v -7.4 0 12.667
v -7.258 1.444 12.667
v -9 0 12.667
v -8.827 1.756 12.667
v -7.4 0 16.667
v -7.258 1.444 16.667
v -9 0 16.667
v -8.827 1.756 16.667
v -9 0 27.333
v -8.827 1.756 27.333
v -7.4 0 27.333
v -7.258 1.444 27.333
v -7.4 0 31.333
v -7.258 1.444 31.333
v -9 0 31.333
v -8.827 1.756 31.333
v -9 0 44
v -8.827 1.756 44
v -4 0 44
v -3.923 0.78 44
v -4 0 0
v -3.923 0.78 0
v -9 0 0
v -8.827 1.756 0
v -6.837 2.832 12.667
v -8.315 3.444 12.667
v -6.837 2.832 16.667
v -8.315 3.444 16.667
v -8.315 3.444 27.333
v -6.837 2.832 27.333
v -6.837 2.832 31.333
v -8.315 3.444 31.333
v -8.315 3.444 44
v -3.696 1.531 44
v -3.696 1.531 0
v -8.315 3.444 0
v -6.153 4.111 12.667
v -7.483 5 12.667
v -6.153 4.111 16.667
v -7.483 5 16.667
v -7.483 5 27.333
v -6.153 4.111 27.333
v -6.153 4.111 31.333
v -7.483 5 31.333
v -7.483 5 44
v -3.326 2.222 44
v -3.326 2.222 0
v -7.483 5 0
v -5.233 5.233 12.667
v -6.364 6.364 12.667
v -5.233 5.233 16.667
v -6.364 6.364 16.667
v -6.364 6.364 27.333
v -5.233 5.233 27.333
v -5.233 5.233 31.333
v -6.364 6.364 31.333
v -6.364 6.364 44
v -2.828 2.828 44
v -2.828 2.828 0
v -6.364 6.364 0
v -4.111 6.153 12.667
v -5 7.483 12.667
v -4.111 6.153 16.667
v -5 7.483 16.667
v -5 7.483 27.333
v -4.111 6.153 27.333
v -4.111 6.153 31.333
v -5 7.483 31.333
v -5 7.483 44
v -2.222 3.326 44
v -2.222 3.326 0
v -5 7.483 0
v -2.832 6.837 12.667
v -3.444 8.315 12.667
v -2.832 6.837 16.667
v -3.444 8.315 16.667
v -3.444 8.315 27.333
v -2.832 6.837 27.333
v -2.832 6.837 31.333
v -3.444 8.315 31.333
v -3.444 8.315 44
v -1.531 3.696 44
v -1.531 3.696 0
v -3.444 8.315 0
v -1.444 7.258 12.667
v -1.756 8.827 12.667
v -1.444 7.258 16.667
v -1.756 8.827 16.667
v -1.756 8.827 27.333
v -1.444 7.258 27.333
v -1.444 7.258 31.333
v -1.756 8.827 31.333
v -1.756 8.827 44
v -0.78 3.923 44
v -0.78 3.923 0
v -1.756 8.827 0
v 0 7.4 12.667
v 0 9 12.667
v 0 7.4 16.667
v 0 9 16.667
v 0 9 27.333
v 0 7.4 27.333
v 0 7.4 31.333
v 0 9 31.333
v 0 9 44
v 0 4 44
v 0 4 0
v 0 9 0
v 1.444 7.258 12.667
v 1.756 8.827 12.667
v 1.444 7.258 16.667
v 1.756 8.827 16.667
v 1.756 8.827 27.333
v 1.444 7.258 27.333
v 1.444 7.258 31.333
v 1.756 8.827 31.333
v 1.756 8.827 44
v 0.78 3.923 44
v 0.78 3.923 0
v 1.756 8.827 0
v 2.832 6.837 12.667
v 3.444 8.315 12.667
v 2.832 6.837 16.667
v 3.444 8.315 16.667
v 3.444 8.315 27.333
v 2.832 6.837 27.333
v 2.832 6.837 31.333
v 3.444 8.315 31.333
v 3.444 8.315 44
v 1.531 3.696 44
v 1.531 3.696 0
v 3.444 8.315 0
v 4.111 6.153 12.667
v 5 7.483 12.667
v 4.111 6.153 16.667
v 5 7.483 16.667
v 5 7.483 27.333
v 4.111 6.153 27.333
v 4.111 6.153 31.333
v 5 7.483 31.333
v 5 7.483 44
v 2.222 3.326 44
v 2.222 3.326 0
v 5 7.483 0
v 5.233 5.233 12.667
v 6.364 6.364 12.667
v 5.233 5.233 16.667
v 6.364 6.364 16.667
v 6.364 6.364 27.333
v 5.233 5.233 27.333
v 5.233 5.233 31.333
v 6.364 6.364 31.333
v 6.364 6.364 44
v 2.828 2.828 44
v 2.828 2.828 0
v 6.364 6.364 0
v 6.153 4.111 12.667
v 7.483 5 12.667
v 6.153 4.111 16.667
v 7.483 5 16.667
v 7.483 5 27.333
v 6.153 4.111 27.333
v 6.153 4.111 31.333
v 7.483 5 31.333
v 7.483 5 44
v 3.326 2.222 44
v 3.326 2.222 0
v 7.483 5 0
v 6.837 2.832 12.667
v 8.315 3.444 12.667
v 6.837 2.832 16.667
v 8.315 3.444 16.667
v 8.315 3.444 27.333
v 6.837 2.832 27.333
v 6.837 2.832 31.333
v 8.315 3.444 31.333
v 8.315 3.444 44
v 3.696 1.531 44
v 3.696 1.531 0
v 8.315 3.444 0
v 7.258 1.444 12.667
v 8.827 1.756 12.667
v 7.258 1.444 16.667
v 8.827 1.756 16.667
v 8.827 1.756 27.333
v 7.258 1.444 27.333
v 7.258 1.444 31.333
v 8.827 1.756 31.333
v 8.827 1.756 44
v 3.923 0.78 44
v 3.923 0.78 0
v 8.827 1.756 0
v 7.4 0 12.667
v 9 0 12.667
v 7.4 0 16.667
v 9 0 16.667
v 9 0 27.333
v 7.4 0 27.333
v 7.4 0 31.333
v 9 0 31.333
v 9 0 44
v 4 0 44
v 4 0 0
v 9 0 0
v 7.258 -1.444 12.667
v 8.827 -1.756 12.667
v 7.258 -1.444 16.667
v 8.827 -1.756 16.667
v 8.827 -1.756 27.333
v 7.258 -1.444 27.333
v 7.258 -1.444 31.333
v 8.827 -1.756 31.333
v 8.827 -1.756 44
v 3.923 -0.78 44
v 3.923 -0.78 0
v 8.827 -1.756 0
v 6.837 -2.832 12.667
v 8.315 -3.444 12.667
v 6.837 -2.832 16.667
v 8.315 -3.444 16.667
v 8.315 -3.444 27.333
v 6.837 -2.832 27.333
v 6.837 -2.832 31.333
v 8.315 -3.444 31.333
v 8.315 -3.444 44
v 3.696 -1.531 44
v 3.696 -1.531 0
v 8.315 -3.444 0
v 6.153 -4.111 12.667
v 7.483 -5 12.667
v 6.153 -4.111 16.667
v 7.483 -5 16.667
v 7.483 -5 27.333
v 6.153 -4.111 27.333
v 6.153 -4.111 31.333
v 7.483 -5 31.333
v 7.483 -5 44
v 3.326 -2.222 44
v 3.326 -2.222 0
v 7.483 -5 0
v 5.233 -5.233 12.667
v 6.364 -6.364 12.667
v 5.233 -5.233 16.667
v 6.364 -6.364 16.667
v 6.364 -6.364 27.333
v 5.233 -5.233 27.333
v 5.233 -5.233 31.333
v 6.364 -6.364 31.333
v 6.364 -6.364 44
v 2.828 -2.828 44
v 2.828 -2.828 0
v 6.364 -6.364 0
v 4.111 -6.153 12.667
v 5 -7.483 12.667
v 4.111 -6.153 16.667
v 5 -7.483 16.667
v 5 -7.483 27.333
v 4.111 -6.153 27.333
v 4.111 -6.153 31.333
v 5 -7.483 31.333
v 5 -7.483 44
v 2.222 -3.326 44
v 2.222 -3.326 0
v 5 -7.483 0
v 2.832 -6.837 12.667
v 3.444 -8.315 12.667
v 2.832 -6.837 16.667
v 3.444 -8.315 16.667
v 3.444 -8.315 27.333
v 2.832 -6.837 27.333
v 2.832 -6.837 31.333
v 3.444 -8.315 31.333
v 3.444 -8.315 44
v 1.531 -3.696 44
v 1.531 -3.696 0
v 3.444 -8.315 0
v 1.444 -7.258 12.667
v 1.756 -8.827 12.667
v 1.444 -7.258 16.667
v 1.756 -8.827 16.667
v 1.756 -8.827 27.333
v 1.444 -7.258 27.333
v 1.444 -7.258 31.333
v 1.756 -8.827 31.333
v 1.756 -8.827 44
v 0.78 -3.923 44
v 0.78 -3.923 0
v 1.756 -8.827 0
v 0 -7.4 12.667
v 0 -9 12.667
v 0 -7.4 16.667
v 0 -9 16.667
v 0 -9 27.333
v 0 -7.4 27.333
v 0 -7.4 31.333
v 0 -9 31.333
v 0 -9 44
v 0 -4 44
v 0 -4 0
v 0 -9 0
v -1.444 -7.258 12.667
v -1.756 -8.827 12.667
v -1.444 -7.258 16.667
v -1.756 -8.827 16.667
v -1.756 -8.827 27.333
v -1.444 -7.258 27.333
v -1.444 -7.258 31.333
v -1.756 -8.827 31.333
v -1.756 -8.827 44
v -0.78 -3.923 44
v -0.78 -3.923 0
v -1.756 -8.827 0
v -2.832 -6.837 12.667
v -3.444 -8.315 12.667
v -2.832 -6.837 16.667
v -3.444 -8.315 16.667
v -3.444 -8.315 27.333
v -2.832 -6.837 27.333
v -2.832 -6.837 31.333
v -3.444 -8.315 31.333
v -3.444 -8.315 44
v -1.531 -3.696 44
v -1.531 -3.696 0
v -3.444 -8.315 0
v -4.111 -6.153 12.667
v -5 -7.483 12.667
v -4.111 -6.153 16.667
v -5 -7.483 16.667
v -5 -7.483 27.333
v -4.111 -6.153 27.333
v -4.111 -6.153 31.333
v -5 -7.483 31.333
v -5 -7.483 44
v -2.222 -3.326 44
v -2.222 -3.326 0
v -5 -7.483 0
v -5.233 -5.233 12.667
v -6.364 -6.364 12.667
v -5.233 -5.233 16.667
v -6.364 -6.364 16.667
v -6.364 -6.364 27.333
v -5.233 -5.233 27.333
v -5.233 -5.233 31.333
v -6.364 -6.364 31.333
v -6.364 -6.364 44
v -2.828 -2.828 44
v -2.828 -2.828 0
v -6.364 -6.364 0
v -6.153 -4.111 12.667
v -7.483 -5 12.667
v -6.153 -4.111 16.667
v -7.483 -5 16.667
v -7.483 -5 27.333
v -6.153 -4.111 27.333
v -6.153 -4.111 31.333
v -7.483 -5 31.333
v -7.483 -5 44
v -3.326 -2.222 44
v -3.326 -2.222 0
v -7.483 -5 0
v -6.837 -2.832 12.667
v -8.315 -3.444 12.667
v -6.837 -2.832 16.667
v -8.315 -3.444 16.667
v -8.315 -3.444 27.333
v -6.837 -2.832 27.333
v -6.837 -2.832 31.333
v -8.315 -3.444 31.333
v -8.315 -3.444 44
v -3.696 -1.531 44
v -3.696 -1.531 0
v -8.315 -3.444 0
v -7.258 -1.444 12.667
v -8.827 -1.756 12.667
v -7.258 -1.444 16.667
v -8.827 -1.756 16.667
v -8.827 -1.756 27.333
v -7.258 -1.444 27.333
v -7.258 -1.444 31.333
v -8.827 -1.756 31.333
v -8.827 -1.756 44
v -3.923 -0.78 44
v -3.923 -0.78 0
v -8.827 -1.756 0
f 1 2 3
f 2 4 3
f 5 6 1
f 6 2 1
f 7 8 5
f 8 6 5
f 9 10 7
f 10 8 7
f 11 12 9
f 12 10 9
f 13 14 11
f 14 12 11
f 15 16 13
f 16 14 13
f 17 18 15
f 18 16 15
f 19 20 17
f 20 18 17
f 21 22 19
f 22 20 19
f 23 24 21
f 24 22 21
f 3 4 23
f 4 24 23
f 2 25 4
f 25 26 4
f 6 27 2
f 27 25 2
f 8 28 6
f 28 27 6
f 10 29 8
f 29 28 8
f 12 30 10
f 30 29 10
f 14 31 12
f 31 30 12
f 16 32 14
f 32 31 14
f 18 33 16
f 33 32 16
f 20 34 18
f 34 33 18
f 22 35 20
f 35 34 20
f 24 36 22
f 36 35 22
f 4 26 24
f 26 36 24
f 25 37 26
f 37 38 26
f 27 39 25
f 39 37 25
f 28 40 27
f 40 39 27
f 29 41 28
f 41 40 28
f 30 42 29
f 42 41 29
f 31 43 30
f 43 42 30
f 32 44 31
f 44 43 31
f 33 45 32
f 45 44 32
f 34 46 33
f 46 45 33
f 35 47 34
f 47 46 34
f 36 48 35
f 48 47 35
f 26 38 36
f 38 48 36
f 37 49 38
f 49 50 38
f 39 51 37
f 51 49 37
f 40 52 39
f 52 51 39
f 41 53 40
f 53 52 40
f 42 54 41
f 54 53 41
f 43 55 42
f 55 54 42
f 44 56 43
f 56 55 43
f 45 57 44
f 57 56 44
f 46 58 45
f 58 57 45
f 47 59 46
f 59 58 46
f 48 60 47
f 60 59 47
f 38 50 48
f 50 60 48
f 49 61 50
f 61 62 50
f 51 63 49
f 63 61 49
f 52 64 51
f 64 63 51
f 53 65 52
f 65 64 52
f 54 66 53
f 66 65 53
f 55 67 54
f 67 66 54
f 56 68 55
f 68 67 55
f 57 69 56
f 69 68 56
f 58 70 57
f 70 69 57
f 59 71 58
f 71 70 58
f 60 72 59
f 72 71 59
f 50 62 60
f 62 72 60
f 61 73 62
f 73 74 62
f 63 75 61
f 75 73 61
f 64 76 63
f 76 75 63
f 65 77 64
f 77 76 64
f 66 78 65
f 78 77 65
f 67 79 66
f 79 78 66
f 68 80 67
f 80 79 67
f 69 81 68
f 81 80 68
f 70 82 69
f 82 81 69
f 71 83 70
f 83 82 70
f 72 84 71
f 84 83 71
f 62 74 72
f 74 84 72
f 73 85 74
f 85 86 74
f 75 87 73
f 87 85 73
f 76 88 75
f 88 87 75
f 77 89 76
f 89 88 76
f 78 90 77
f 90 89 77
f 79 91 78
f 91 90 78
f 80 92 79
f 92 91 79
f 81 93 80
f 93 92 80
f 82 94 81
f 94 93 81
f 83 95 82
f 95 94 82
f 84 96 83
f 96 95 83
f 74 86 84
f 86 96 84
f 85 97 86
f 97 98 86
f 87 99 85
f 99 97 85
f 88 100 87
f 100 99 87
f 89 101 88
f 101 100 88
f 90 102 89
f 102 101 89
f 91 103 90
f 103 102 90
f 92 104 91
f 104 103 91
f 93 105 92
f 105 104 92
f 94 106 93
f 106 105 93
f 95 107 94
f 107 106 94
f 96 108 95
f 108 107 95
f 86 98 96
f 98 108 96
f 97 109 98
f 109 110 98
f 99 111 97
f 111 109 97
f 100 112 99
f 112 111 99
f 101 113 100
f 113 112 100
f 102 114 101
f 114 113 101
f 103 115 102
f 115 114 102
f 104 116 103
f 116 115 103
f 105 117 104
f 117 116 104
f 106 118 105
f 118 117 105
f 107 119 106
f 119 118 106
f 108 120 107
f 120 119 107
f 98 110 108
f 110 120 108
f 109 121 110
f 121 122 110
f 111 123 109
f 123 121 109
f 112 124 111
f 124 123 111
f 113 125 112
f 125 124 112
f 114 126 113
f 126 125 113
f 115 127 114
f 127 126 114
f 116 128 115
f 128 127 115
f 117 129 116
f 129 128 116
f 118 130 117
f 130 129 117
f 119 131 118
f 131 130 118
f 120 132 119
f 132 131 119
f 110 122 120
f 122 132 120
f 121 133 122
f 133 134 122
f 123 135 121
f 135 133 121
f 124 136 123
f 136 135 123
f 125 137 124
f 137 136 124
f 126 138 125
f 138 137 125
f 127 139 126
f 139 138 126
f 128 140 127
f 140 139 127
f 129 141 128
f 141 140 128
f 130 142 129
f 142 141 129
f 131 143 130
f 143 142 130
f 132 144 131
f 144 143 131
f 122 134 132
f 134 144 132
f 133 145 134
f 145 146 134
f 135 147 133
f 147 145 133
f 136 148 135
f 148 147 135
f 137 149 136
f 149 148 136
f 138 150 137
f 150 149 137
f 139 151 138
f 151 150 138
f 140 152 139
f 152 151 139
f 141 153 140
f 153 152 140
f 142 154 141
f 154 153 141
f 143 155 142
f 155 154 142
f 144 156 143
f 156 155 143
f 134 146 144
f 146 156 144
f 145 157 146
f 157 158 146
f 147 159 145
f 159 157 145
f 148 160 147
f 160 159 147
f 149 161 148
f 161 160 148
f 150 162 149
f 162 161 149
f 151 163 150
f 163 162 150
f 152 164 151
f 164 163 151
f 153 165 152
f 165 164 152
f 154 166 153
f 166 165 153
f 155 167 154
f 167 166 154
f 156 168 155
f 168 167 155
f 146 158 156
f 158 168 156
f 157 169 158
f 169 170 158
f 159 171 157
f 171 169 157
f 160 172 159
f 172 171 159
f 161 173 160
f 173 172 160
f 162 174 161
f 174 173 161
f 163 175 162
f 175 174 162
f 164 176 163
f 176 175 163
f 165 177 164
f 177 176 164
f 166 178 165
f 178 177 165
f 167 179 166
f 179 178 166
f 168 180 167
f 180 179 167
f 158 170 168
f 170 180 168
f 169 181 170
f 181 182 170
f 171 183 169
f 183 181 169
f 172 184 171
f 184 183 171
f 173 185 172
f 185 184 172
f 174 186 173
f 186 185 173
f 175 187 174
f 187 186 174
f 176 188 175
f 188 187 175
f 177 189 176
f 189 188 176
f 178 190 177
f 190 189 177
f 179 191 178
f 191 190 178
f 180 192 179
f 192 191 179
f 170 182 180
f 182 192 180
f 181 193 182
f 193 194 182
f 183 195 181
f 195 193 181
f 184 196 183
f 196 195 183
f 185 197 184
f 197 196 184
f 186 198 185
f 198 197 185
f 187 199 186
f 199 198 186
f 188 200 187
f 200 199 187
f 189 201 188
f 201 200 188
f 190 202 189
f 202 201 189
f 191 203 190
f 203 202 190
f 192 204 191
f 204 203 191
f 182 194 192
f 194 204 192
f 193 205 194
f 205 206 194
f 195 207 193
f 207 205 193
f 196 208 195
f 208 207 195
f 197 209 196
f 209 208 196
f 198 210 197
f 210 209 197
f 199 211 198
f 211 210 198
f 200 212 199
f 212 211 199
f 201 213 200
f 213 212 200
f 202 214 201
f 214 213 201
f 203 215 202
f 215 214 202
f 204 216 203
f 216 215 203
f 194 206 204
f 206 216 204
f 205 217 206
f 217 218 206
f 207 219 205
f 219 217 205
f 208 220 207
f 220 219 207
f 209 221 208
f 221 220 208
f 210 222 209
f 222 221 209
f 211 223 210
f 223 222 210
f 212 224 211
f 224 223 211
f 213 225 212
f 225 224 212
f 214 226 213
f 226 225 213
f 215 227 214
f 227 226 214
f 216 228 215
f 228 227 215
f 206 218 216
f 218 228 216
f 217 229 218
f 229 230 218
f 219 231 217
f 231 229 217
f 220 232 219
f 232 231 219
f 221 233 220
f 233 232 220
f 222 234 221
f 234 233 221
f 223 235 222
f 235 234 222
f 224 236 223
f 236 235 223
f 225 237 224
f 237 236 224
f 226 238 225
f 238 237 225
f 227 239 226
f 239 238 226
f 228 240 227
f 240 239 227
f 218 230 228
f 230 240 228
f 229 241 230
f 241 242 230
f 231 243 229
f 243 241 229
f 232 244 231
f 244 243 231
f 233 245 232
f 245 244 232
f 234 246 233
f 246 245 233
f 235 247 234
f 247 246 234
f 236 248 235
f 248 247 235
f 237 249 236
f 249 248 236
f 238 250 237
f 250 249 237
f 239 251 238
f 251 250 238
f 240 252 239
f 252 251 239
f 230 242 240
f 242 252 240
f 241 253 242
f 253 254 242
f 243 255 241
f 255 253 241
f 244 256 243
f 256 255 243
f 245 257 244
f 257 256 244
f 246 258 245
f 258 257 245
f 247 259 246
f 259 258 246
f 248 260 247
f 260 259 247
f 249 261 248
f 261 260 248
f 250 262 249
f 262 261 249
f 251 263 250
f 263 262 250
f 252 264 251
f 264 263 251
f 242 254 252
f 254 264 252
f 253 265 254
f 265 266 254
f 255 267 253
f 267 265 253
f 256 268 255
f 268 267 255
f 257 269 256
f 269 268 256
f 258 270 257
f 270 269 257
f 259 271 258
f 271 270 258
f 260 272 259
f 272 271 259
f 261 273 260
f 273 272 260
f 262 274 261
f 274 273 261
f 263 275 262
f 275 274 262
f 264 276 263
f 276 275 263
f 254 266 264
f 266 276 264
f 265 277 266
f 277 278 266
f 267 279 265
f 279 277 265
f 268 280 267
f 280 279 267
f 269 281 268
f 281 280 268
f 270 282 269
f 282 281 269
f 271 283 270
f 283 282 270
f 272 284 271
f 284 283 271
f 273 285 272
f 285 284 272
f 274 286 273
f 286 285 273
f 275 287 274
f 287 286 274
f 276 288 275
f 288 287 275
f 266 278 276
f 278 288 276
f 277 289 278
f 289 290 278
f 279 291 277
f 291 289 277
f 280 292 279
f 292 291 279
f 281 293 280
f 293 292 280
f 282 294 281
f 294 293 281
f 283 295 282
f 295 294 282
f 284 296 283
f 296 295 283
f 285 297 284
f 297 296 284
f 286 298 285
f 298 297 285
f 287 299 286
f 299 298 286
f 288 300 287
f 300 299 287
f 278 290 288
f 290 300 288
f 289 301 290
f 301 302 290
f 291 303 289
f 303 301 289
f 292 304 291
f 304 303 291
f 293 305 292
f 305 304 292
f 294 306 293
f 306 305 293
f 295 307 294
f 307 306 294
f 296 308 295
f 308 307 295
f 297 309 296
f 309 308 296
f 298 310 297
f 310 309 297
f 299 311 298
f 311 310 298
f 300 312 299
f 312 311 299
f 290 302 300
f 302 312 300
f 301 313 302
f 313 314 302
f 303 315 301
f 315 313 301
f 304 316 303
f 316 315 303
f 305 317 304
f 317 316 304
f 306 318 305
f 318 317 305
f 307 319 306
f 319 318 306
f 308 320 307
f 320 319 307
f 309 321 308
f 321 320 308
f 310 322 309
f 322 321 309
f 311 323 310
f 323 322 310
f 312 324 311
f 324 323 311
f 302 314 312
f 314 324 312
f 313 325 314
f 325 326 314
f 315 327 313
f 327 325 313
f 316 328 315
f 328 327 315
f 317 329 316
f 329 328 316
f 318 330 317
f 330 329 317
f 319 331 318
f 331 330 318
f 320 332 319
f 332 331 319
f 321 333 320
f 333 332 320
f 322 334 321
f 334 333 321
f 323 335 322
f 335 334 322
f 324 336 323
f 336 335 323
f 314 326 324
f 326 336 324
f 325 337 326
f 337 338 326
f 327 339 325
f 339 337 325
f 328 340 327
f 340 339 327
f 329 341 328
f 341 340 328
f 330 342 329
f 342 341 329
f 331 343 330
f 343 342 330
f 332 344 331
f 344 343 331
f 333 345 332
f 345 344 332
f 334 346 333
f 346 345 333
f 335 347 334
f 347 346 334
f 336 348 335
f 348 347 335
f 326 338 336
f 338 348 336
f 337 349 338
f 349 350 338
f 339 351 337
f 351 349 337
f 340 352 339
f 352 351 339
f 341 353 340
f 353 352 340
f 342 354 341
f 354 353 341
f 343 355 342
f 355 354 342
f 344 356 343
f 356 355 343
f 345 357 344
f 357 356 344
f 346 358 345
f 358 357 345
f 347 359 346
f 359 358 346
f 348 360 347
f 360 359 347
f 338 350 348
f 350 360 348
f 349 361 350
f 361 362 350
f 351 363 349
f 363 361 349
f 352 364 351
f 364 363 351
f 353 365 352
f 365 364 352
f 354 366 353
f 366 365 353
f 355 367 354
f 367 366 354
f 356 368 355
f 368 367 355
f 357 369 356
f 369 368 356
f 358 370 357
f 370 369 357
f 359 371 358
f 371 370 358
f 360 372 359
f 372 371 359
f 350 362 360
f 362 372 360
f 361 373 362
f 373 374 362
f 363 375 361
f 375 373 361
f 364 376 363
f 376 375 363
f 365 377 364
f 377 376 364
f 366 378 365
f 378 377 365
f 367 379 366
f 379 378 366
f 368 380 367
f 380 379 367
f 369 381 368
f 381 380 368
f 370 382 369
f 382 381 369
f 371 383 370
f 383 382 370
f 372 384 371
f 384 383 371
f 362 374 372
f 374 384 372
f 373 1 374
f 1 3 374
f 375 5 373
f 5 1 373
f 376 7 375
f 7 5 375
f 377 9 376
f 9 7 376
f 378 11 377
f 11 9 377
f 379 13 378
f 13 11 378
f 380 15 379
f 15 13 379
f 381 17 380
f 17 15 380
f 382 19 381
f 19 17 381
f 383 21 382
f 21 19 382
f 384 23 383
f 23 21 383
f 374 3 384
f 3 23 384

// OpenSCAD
$fn = 32;

// ----------------------------------------------------------------------
// Grooved revolve: stepped, bore R4
// ----------------------------------------------------------------------

// --- parameters (mm) ---
bore_r = 4;               // bore radius
outer_r = 9;              // outer radius of the body
total_h = 44;             // overall height, Z
wall = 5;                 // radial wall thickness
groove_w = 4;             // groove width
groove_d = 1.6;           // groove depth
grooves = 2;              // number of outer grooves

bbox_x = 2 * outer_r;  // full diameter
bore_d = 2 * bore_r;  // bore diameter
body_d = 2 * outer_r;  // body diameter
revolve_angle = 360;  // full turn around the Z axis

profile = [[4, 0], [9, 0], [9, 12.667], [7.4, 12.667], [7.4, 16.667], [9, 16.667], [9, 27.333], [7.4, 27.333], [7.4, 31.333], [9, 31.333], [9, 44], [4, 44]];  // primary outline, 12 points, counter clockwise

// --- the one profile operation ---
rotate_extrude(angle = revolve_angle) polygon(points = profile);
